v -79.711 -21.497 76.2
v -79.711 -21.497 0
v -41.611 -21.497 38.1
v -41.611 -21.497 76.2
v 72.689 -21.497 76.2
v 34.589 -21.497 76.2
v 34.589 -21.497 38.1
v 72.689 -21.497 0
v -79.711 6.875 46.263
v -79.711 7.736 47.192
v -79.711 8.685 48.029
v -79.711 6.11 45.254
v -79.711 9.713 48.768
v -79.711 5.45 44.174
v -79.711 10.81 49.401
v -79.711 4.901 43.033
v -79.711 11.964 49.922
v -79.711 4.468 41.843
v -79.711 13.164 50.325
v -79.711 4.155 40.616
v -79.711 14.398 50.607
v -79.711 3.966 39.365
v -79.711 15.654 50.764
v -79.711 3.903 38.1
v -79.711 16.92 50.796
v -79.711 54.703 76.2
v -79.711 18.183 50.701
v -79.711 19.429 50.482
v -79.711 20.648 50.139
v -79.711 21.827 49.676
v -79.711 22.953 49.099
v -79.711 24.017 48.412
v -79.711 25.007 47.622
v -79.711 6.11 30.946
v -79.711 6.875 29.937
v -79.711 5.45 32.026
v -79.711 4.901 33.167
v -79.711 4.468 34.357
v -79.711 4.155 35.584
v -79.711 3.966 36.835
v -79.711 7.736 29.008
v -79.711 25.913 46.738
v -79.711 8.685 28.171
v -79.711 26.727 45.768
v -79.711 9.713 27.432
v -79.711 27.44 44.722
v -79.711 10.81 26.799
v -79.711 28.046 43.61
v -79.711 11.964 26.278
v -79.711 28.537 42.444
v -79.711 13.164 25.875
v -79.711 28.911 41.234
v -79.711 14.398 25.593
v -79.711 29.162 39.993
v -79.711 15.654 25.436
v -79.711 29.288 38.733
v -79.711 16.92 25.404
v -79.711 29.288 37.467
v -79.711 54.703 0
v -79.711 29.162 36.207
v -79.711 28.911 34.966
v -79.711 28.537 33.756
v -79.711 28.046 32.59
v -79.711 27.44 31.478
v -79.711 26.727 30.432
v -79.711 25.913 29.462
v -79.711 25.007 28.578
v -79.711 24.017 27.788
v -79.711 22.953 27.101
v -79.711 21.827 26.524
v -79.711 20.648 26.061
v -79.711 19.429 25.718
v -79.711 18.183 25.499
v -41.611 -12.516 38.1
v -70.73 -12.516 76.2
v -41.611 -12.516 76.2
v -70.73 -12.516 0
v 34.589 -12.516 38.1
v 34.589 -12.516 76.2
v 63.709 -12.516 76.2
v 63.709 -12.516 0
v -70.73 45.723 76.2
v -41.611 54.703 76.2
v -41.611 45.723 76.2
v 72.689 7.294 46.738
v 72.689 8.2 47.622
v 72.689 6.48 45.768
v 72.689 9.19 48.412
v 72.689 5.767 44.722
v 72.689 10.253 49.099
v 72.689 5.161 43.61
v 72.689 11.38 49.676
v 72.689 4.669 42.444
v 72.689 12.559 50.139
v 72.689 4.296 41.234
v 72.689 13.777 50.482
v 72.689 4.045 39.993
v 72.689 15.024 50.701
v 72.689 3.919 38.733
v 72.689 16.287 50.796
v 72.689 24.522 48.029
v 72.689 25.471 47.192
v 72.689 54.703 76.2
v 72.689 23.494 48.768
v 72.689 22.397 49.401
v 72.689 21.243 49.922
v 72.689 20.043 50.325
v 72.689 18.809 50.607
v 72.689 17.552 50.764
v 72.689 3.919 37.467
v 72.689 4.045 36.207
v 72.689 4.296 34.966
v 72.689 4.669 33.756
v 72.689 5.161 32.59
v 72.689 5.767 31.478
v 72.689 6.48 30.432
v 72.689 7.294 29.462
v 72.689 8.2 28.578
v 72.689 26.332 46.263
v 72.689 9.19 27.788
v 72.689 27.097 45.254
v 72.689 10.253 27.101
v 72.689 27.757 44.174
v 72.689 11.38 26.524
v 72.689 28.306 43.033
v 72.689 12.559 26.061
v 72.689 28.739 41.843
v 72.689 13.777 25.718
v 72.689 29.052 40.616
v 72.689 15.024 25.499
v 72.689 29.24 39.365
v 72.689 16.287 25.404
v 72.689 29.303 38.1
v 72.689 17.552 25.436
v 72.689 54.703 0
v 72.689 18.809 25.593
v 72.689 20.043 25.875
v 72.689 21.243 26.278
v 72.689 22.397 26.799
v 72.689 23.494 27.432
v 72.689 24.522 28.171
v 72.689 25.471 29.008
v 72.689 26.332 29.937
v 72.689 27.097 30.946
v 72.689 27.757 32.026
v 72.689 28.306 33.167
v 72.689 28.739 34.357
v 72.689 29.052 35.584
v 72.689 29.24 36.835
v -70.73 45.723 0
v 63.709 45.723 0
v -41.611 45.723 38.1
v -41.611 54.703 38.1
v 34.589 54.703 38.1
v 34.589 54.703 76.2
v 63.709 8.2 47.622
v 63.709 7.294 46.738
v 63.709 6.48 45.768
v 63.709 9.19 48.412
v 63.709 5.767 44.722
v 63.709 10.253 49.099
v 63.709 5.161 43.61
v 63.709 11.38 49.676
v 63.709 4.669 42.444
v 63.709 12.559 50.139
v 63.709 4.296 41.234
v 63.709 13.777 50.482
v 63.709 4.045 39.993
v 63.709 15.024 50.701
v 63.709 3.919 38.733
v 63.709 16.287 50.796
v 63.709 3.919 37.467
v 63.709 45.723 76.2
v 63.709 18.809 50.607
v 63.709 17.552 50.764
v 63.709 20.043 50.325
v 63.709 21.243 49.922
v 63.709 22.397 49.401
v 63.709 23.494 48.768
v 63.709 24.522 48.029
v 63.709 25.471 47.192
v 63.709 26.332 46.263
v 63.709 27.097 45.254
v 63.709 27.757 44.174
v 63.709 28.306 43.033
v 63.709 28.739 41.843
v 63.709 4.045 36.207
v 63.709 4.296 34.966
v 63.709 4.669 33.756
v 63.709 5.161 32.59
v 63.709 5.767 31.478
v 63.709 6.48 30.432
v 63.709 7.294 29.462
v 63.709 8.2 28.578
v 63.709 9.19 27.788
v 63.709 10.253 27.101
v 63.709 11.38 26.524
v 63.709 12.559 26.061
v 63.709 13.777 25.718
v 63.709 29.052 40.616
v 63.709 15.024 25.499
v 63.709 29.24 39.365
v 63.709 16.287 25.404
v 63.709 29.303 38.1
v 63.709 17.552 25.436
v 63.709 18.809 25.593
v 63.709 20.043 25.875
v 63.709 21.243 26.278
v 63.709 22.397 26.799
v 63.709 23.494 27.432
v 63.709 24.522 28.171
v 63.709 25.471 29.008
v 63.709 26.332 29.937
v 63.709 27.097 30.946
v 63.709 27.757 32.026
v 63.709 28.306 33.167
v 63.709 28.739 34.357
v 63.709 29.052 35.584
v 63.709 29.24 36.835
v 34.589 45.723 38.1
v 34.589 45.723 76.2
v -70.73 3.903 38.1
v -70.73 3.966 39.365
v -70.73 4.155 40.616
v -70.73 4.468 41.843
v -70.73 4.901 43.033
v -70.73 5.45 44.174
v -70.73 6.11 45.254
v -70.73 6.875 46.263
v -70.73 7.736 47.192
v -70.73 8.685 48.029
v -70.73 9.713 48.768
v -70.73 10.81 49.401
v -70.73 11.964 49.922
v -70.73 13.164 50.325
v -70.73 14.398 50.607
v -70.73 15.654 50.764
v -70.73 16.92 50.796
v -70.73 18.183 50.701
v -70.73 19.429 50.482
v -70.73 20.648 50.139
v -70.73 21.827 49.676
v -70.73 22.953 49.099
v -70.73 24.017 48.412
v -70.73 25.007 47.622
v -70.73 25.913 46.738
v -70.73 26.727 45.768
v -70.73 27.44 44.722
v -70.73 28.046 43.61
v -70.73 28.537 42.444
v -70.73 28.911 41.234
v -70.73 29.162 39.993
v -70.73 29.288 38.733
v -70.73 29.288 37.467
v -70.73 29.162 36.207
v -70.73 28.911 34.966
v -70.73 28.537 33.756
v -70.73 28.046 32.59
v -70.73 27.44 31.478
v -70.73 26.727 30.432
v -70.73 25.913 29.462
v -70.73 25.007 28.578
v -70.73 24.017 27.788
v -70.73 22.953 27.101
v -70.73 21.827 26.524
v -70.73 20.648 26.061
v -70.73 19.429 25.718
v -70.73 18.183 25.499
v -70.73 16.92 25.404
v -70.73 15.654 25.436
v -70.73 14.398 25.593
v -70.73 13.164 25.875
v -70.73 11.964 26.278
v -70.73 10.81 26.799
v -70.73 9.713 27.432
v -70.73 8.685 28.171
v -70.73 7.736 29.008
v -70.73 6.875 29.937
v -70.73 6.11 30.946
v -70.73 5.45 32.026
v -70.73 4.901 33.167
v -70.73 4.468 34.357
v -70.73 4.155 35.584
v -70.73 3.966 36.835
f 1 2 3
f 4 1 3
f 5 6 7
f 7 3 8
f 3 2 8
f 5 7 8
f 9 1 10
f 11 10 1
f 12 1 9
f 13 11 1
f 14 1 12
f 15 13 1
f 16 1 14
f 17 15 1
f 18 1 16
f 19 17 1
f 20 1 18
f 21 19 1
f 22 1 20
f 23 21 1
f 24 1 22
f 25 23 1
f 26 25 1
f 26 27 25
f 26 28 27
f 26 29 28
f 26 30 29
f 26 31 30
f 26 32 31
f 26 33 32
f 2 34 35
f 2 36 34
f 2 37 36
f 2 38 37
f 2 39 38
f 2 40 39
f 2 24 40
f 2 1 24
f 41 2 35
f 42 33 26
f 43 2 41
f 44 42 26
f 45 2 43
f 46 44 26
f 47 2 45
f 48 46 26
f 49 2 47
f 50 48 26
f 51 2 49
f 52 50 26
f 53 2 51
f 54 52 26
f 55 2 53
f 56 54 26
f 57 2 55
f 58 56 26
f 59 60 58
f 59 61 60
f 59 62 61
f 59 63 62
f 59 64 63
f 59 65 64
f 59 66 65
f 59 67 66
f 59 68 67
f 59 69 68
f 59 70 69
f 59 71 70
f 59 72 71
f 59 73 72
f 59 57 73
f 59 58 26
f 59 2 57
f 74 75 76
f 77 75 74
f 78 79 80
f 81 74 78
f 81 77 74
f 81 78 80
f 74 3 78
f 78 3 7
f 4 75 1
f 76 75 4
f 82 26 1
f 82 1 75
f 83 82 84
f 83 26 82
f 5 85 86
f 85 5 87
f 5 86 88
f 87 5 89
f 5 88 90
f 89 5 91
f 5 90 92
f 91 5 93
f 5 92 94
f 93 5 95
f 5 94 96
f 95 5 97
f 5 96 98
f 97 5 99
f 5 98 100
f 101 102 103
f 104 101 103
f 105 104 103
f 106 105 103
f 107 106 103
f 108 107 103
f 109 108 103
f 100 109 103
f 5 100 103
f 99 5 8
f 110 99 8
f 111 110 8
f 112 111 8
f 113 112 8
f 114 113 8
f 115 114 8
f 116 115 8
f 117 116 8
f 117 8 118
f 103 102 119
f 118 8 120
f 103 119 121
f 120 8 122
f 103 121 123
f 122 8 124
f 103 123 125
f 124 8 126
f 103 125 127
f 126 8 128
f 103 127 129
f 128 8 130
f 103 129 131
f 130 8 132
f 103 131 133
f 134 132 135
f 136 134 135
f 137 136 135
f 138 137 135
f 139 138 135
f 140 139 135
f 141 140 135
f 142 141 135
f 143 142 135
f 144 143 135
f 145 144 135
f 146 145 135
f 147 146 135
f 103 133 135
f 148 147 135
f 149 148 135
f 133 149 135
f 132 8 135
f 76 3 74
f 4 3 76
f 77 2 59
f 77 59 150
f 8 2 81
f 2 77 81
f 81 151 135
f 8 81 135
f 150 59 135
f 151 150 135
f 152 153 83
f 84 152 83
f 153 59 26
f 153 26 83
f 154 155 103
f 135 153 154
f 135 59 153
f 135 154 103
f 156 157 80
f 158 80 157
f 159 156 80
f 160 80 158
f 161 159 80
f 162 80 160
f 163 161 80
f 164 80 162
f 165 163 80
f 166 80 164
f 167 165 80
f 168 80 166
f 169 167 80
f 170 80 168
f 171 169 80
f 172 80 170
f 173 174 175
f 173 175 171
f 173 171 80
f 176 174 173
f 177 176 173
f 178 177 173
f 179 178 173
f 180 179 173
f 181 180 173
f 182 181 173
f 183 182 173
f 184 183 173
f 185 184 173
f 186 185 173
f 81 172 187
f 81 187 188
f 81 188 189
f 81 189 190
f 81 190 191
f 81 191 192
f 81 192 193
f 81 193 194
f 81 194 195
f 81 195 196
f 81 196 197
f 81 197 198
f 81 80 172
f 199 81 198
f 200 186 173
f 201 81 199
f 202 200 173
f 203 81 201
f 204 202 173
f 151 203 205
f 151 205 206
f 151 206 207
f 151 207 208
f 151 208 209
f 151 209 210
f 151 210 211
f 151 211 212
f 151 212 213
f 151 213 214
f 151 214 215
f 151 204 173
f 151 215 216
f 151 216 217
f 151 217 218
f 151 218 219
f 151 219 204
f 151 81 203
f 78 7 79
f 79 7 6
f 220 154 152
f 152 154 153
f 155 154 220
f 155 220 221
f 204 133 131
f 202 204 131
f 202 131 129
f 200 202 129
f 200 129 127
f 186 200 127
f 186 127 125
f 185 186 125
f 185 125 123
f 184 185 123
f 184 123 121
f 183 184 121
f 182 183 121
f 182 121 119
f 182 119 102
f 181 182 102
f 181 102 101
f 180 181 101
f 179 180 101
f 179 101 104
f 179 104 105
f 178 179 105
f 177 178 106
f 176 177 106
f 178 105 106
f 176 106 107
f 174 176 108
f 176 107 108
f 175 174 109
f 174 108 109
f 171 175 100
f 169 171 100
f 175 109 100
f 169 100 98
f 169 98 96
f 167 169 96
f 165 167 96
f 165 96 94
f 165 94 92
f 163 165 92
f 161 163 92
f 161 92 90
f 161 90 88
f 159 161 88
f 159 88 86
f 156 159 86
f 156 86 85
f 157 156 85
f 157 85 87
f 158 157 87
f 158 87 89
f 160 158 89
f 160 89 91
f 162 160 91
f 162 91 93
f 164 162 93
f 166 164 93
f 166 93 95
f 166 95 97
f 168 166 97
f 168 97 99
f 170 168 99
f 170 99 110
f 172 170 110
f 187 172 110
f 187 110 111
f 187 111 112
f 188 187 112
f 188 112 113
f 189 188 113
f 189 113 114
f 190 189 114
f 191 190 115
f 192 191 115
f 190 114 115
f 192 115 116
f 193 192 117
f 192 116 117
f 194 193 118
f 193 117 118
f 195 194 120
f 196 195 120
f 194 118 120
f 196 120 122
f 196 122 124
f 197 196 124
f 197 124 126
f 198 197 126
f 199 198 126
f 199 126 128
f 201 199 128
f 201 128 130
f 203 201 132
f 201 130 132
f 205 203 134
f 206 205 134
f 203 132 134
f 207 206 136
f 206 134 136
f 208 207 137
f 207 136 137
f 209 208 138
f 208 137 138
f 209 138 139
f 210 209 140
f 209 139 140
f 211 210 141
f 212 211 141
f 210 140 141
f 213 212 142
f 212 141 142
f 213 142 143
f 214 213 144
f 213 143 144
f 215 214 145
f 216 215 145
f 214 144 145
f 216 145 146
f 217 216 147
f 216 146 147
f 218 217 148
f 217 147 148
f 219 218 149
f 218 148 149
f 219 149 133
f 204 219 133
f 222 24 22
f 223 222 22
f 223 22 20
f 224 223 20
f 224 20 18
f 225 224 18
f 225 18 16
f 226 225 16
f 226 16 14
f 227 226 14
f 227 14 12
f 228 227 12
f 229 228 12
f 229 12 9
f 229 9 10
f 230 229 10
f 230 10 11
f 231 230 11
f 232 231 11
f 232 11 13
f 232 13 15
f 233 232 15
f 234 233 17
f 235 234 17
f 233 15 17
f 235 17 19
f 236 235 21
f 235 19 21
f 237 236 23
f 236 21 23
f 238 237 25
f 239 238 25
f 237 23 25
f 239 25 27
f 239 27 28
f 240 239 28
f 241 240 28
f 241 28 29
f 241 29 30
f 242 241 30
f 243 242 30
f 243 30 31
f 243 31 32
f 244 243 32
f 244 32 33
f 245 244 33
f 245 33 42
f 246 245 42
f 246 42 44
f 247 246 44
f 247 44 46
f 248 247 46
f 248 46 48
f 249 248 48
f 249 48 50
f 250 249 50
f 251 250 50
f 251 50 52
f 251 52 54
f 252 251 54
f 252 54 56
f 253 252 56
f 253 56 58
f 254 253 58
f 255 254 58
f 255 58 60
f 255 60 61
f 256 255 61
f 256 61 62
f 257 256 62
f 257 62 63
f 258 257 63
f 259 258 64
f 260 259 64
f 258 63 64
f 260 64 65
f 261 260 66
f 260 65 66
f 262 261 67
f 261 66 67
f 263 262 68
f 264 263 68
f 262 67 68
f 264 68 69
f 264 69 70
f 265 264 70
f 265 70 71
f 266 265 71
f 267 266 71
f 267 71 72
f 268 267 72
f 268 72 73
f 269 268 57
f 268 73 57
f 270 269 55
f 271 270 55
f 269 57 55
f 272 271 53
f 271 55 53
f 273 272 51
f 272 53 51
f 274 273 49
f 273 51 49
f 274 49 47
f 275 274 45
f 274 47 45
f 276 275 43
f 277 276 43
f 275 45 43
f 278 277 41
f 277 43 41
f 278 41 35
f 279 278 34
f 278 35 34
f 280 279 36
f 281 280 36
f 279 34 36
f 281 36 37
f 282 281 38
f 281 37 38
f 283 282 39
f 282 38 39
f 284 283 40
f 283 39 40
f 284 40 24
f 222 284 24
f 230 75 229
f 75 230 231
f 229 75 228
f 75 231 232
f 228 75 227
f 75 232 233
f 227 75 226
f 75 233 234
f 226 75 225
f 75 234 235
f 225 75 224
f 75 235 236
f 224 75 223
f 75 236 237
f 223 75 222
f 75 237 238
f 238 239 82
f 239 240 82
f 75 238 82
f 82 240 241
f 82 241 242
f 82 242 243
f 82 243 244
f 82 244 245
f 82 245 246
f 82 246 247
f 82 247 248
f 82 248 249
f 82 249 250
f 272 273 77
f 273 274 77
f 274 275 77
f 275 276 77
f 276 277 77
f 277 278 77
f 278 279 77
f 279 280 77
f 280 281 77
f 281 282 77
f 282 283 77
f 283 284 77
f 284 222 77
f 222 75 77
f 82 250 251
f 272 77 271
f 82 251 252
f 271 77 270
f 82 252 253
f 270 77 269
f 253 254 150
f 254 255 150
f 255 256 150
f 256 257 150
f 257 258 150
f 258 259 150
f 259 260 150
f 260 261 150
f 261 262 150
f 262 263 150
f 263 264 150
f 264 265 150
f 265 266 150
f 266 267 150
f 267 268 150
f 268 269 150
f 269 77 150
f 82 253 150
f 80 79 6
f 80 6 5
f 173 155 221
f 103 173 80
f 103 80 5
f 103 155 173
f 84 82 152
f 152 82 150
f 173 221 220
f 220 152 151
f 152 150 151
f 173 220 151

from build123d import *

# Parameters (mm, degrees)
F0_W     = 152.4
F0_H     = 76.2
F0_W_2   = 134.439488
F0_H_2   = 58.239488
F1_DEPTH = 76.2
F2_W     = 76.2
F2_H     = 38.1
F3_DEPTH = 25.4
F4_W     = 76.2
F4_H     = 38.1
F5_DEPTH = 25.4
F6_R     = 12.7
F7_DEPTH = 51.562
F8_R     = 12.7
F9_DEPTH = 25.4


with BuildPart() as f1:
    # F0 (on Top) → F1 (new body)
    with BuildSketch(Plane.XY):
        with Locations((-3.510571, 16.603382)):
            Rectangle(F0_W, F0_H)
        with Locations((-3.510571, 16.603382)):
            Rectangle(F0_W_2, F0_H_2, mode=Mode.SUBTRACT)
    extrude(amount=F1_DEPTH)

    # F2 (on face) → F3 (cut)
    with BuildSketch(Plane.XZ.offset(21.496618)):
        with Locations((-3.510571, 57.15)):
            Rectangle(F2_W, F2_H)
    extrude(amount=-F3_DEPTH, mode=Mode.SUBTRACT)

    # F4 (on face) → F5 (cut)
    with BuildSketch(Plane(origin=(0, 54.703382, 0), x_dir=(-1, 0, 0), z_dir=(0, 1, 0))):
        with Locations((3.510571, 57.15)):
            Rectangle(F4_W, F4_H)
    extrude(amount=-F5_DEPTH, mode=Mode.SUBTRACT)

    # F6 (on face) → F7 (cut)
    with BuildSketch(Plane(origin=(-79.710571, 0, 0), x_dir=(0, -1, 0), z_dir=(-1, 0, 0))):
        with Locations((-16.603382, 38.1)):
            Circle(F6_R)
    extrude(amount=-F7_DEPTH, mode=Mode.SUBTRACT)

    # F8 (on face) → F9 (cut)
    with BuildSketch(Plane.YZ.offset(72.689429)):
        with Locations((16.603382, 38.1)):
            Circle(F8_R)
    extrude(amount=-F9_DEPTH, mode=Mode.SUBTRACT)


solid = f1.part
